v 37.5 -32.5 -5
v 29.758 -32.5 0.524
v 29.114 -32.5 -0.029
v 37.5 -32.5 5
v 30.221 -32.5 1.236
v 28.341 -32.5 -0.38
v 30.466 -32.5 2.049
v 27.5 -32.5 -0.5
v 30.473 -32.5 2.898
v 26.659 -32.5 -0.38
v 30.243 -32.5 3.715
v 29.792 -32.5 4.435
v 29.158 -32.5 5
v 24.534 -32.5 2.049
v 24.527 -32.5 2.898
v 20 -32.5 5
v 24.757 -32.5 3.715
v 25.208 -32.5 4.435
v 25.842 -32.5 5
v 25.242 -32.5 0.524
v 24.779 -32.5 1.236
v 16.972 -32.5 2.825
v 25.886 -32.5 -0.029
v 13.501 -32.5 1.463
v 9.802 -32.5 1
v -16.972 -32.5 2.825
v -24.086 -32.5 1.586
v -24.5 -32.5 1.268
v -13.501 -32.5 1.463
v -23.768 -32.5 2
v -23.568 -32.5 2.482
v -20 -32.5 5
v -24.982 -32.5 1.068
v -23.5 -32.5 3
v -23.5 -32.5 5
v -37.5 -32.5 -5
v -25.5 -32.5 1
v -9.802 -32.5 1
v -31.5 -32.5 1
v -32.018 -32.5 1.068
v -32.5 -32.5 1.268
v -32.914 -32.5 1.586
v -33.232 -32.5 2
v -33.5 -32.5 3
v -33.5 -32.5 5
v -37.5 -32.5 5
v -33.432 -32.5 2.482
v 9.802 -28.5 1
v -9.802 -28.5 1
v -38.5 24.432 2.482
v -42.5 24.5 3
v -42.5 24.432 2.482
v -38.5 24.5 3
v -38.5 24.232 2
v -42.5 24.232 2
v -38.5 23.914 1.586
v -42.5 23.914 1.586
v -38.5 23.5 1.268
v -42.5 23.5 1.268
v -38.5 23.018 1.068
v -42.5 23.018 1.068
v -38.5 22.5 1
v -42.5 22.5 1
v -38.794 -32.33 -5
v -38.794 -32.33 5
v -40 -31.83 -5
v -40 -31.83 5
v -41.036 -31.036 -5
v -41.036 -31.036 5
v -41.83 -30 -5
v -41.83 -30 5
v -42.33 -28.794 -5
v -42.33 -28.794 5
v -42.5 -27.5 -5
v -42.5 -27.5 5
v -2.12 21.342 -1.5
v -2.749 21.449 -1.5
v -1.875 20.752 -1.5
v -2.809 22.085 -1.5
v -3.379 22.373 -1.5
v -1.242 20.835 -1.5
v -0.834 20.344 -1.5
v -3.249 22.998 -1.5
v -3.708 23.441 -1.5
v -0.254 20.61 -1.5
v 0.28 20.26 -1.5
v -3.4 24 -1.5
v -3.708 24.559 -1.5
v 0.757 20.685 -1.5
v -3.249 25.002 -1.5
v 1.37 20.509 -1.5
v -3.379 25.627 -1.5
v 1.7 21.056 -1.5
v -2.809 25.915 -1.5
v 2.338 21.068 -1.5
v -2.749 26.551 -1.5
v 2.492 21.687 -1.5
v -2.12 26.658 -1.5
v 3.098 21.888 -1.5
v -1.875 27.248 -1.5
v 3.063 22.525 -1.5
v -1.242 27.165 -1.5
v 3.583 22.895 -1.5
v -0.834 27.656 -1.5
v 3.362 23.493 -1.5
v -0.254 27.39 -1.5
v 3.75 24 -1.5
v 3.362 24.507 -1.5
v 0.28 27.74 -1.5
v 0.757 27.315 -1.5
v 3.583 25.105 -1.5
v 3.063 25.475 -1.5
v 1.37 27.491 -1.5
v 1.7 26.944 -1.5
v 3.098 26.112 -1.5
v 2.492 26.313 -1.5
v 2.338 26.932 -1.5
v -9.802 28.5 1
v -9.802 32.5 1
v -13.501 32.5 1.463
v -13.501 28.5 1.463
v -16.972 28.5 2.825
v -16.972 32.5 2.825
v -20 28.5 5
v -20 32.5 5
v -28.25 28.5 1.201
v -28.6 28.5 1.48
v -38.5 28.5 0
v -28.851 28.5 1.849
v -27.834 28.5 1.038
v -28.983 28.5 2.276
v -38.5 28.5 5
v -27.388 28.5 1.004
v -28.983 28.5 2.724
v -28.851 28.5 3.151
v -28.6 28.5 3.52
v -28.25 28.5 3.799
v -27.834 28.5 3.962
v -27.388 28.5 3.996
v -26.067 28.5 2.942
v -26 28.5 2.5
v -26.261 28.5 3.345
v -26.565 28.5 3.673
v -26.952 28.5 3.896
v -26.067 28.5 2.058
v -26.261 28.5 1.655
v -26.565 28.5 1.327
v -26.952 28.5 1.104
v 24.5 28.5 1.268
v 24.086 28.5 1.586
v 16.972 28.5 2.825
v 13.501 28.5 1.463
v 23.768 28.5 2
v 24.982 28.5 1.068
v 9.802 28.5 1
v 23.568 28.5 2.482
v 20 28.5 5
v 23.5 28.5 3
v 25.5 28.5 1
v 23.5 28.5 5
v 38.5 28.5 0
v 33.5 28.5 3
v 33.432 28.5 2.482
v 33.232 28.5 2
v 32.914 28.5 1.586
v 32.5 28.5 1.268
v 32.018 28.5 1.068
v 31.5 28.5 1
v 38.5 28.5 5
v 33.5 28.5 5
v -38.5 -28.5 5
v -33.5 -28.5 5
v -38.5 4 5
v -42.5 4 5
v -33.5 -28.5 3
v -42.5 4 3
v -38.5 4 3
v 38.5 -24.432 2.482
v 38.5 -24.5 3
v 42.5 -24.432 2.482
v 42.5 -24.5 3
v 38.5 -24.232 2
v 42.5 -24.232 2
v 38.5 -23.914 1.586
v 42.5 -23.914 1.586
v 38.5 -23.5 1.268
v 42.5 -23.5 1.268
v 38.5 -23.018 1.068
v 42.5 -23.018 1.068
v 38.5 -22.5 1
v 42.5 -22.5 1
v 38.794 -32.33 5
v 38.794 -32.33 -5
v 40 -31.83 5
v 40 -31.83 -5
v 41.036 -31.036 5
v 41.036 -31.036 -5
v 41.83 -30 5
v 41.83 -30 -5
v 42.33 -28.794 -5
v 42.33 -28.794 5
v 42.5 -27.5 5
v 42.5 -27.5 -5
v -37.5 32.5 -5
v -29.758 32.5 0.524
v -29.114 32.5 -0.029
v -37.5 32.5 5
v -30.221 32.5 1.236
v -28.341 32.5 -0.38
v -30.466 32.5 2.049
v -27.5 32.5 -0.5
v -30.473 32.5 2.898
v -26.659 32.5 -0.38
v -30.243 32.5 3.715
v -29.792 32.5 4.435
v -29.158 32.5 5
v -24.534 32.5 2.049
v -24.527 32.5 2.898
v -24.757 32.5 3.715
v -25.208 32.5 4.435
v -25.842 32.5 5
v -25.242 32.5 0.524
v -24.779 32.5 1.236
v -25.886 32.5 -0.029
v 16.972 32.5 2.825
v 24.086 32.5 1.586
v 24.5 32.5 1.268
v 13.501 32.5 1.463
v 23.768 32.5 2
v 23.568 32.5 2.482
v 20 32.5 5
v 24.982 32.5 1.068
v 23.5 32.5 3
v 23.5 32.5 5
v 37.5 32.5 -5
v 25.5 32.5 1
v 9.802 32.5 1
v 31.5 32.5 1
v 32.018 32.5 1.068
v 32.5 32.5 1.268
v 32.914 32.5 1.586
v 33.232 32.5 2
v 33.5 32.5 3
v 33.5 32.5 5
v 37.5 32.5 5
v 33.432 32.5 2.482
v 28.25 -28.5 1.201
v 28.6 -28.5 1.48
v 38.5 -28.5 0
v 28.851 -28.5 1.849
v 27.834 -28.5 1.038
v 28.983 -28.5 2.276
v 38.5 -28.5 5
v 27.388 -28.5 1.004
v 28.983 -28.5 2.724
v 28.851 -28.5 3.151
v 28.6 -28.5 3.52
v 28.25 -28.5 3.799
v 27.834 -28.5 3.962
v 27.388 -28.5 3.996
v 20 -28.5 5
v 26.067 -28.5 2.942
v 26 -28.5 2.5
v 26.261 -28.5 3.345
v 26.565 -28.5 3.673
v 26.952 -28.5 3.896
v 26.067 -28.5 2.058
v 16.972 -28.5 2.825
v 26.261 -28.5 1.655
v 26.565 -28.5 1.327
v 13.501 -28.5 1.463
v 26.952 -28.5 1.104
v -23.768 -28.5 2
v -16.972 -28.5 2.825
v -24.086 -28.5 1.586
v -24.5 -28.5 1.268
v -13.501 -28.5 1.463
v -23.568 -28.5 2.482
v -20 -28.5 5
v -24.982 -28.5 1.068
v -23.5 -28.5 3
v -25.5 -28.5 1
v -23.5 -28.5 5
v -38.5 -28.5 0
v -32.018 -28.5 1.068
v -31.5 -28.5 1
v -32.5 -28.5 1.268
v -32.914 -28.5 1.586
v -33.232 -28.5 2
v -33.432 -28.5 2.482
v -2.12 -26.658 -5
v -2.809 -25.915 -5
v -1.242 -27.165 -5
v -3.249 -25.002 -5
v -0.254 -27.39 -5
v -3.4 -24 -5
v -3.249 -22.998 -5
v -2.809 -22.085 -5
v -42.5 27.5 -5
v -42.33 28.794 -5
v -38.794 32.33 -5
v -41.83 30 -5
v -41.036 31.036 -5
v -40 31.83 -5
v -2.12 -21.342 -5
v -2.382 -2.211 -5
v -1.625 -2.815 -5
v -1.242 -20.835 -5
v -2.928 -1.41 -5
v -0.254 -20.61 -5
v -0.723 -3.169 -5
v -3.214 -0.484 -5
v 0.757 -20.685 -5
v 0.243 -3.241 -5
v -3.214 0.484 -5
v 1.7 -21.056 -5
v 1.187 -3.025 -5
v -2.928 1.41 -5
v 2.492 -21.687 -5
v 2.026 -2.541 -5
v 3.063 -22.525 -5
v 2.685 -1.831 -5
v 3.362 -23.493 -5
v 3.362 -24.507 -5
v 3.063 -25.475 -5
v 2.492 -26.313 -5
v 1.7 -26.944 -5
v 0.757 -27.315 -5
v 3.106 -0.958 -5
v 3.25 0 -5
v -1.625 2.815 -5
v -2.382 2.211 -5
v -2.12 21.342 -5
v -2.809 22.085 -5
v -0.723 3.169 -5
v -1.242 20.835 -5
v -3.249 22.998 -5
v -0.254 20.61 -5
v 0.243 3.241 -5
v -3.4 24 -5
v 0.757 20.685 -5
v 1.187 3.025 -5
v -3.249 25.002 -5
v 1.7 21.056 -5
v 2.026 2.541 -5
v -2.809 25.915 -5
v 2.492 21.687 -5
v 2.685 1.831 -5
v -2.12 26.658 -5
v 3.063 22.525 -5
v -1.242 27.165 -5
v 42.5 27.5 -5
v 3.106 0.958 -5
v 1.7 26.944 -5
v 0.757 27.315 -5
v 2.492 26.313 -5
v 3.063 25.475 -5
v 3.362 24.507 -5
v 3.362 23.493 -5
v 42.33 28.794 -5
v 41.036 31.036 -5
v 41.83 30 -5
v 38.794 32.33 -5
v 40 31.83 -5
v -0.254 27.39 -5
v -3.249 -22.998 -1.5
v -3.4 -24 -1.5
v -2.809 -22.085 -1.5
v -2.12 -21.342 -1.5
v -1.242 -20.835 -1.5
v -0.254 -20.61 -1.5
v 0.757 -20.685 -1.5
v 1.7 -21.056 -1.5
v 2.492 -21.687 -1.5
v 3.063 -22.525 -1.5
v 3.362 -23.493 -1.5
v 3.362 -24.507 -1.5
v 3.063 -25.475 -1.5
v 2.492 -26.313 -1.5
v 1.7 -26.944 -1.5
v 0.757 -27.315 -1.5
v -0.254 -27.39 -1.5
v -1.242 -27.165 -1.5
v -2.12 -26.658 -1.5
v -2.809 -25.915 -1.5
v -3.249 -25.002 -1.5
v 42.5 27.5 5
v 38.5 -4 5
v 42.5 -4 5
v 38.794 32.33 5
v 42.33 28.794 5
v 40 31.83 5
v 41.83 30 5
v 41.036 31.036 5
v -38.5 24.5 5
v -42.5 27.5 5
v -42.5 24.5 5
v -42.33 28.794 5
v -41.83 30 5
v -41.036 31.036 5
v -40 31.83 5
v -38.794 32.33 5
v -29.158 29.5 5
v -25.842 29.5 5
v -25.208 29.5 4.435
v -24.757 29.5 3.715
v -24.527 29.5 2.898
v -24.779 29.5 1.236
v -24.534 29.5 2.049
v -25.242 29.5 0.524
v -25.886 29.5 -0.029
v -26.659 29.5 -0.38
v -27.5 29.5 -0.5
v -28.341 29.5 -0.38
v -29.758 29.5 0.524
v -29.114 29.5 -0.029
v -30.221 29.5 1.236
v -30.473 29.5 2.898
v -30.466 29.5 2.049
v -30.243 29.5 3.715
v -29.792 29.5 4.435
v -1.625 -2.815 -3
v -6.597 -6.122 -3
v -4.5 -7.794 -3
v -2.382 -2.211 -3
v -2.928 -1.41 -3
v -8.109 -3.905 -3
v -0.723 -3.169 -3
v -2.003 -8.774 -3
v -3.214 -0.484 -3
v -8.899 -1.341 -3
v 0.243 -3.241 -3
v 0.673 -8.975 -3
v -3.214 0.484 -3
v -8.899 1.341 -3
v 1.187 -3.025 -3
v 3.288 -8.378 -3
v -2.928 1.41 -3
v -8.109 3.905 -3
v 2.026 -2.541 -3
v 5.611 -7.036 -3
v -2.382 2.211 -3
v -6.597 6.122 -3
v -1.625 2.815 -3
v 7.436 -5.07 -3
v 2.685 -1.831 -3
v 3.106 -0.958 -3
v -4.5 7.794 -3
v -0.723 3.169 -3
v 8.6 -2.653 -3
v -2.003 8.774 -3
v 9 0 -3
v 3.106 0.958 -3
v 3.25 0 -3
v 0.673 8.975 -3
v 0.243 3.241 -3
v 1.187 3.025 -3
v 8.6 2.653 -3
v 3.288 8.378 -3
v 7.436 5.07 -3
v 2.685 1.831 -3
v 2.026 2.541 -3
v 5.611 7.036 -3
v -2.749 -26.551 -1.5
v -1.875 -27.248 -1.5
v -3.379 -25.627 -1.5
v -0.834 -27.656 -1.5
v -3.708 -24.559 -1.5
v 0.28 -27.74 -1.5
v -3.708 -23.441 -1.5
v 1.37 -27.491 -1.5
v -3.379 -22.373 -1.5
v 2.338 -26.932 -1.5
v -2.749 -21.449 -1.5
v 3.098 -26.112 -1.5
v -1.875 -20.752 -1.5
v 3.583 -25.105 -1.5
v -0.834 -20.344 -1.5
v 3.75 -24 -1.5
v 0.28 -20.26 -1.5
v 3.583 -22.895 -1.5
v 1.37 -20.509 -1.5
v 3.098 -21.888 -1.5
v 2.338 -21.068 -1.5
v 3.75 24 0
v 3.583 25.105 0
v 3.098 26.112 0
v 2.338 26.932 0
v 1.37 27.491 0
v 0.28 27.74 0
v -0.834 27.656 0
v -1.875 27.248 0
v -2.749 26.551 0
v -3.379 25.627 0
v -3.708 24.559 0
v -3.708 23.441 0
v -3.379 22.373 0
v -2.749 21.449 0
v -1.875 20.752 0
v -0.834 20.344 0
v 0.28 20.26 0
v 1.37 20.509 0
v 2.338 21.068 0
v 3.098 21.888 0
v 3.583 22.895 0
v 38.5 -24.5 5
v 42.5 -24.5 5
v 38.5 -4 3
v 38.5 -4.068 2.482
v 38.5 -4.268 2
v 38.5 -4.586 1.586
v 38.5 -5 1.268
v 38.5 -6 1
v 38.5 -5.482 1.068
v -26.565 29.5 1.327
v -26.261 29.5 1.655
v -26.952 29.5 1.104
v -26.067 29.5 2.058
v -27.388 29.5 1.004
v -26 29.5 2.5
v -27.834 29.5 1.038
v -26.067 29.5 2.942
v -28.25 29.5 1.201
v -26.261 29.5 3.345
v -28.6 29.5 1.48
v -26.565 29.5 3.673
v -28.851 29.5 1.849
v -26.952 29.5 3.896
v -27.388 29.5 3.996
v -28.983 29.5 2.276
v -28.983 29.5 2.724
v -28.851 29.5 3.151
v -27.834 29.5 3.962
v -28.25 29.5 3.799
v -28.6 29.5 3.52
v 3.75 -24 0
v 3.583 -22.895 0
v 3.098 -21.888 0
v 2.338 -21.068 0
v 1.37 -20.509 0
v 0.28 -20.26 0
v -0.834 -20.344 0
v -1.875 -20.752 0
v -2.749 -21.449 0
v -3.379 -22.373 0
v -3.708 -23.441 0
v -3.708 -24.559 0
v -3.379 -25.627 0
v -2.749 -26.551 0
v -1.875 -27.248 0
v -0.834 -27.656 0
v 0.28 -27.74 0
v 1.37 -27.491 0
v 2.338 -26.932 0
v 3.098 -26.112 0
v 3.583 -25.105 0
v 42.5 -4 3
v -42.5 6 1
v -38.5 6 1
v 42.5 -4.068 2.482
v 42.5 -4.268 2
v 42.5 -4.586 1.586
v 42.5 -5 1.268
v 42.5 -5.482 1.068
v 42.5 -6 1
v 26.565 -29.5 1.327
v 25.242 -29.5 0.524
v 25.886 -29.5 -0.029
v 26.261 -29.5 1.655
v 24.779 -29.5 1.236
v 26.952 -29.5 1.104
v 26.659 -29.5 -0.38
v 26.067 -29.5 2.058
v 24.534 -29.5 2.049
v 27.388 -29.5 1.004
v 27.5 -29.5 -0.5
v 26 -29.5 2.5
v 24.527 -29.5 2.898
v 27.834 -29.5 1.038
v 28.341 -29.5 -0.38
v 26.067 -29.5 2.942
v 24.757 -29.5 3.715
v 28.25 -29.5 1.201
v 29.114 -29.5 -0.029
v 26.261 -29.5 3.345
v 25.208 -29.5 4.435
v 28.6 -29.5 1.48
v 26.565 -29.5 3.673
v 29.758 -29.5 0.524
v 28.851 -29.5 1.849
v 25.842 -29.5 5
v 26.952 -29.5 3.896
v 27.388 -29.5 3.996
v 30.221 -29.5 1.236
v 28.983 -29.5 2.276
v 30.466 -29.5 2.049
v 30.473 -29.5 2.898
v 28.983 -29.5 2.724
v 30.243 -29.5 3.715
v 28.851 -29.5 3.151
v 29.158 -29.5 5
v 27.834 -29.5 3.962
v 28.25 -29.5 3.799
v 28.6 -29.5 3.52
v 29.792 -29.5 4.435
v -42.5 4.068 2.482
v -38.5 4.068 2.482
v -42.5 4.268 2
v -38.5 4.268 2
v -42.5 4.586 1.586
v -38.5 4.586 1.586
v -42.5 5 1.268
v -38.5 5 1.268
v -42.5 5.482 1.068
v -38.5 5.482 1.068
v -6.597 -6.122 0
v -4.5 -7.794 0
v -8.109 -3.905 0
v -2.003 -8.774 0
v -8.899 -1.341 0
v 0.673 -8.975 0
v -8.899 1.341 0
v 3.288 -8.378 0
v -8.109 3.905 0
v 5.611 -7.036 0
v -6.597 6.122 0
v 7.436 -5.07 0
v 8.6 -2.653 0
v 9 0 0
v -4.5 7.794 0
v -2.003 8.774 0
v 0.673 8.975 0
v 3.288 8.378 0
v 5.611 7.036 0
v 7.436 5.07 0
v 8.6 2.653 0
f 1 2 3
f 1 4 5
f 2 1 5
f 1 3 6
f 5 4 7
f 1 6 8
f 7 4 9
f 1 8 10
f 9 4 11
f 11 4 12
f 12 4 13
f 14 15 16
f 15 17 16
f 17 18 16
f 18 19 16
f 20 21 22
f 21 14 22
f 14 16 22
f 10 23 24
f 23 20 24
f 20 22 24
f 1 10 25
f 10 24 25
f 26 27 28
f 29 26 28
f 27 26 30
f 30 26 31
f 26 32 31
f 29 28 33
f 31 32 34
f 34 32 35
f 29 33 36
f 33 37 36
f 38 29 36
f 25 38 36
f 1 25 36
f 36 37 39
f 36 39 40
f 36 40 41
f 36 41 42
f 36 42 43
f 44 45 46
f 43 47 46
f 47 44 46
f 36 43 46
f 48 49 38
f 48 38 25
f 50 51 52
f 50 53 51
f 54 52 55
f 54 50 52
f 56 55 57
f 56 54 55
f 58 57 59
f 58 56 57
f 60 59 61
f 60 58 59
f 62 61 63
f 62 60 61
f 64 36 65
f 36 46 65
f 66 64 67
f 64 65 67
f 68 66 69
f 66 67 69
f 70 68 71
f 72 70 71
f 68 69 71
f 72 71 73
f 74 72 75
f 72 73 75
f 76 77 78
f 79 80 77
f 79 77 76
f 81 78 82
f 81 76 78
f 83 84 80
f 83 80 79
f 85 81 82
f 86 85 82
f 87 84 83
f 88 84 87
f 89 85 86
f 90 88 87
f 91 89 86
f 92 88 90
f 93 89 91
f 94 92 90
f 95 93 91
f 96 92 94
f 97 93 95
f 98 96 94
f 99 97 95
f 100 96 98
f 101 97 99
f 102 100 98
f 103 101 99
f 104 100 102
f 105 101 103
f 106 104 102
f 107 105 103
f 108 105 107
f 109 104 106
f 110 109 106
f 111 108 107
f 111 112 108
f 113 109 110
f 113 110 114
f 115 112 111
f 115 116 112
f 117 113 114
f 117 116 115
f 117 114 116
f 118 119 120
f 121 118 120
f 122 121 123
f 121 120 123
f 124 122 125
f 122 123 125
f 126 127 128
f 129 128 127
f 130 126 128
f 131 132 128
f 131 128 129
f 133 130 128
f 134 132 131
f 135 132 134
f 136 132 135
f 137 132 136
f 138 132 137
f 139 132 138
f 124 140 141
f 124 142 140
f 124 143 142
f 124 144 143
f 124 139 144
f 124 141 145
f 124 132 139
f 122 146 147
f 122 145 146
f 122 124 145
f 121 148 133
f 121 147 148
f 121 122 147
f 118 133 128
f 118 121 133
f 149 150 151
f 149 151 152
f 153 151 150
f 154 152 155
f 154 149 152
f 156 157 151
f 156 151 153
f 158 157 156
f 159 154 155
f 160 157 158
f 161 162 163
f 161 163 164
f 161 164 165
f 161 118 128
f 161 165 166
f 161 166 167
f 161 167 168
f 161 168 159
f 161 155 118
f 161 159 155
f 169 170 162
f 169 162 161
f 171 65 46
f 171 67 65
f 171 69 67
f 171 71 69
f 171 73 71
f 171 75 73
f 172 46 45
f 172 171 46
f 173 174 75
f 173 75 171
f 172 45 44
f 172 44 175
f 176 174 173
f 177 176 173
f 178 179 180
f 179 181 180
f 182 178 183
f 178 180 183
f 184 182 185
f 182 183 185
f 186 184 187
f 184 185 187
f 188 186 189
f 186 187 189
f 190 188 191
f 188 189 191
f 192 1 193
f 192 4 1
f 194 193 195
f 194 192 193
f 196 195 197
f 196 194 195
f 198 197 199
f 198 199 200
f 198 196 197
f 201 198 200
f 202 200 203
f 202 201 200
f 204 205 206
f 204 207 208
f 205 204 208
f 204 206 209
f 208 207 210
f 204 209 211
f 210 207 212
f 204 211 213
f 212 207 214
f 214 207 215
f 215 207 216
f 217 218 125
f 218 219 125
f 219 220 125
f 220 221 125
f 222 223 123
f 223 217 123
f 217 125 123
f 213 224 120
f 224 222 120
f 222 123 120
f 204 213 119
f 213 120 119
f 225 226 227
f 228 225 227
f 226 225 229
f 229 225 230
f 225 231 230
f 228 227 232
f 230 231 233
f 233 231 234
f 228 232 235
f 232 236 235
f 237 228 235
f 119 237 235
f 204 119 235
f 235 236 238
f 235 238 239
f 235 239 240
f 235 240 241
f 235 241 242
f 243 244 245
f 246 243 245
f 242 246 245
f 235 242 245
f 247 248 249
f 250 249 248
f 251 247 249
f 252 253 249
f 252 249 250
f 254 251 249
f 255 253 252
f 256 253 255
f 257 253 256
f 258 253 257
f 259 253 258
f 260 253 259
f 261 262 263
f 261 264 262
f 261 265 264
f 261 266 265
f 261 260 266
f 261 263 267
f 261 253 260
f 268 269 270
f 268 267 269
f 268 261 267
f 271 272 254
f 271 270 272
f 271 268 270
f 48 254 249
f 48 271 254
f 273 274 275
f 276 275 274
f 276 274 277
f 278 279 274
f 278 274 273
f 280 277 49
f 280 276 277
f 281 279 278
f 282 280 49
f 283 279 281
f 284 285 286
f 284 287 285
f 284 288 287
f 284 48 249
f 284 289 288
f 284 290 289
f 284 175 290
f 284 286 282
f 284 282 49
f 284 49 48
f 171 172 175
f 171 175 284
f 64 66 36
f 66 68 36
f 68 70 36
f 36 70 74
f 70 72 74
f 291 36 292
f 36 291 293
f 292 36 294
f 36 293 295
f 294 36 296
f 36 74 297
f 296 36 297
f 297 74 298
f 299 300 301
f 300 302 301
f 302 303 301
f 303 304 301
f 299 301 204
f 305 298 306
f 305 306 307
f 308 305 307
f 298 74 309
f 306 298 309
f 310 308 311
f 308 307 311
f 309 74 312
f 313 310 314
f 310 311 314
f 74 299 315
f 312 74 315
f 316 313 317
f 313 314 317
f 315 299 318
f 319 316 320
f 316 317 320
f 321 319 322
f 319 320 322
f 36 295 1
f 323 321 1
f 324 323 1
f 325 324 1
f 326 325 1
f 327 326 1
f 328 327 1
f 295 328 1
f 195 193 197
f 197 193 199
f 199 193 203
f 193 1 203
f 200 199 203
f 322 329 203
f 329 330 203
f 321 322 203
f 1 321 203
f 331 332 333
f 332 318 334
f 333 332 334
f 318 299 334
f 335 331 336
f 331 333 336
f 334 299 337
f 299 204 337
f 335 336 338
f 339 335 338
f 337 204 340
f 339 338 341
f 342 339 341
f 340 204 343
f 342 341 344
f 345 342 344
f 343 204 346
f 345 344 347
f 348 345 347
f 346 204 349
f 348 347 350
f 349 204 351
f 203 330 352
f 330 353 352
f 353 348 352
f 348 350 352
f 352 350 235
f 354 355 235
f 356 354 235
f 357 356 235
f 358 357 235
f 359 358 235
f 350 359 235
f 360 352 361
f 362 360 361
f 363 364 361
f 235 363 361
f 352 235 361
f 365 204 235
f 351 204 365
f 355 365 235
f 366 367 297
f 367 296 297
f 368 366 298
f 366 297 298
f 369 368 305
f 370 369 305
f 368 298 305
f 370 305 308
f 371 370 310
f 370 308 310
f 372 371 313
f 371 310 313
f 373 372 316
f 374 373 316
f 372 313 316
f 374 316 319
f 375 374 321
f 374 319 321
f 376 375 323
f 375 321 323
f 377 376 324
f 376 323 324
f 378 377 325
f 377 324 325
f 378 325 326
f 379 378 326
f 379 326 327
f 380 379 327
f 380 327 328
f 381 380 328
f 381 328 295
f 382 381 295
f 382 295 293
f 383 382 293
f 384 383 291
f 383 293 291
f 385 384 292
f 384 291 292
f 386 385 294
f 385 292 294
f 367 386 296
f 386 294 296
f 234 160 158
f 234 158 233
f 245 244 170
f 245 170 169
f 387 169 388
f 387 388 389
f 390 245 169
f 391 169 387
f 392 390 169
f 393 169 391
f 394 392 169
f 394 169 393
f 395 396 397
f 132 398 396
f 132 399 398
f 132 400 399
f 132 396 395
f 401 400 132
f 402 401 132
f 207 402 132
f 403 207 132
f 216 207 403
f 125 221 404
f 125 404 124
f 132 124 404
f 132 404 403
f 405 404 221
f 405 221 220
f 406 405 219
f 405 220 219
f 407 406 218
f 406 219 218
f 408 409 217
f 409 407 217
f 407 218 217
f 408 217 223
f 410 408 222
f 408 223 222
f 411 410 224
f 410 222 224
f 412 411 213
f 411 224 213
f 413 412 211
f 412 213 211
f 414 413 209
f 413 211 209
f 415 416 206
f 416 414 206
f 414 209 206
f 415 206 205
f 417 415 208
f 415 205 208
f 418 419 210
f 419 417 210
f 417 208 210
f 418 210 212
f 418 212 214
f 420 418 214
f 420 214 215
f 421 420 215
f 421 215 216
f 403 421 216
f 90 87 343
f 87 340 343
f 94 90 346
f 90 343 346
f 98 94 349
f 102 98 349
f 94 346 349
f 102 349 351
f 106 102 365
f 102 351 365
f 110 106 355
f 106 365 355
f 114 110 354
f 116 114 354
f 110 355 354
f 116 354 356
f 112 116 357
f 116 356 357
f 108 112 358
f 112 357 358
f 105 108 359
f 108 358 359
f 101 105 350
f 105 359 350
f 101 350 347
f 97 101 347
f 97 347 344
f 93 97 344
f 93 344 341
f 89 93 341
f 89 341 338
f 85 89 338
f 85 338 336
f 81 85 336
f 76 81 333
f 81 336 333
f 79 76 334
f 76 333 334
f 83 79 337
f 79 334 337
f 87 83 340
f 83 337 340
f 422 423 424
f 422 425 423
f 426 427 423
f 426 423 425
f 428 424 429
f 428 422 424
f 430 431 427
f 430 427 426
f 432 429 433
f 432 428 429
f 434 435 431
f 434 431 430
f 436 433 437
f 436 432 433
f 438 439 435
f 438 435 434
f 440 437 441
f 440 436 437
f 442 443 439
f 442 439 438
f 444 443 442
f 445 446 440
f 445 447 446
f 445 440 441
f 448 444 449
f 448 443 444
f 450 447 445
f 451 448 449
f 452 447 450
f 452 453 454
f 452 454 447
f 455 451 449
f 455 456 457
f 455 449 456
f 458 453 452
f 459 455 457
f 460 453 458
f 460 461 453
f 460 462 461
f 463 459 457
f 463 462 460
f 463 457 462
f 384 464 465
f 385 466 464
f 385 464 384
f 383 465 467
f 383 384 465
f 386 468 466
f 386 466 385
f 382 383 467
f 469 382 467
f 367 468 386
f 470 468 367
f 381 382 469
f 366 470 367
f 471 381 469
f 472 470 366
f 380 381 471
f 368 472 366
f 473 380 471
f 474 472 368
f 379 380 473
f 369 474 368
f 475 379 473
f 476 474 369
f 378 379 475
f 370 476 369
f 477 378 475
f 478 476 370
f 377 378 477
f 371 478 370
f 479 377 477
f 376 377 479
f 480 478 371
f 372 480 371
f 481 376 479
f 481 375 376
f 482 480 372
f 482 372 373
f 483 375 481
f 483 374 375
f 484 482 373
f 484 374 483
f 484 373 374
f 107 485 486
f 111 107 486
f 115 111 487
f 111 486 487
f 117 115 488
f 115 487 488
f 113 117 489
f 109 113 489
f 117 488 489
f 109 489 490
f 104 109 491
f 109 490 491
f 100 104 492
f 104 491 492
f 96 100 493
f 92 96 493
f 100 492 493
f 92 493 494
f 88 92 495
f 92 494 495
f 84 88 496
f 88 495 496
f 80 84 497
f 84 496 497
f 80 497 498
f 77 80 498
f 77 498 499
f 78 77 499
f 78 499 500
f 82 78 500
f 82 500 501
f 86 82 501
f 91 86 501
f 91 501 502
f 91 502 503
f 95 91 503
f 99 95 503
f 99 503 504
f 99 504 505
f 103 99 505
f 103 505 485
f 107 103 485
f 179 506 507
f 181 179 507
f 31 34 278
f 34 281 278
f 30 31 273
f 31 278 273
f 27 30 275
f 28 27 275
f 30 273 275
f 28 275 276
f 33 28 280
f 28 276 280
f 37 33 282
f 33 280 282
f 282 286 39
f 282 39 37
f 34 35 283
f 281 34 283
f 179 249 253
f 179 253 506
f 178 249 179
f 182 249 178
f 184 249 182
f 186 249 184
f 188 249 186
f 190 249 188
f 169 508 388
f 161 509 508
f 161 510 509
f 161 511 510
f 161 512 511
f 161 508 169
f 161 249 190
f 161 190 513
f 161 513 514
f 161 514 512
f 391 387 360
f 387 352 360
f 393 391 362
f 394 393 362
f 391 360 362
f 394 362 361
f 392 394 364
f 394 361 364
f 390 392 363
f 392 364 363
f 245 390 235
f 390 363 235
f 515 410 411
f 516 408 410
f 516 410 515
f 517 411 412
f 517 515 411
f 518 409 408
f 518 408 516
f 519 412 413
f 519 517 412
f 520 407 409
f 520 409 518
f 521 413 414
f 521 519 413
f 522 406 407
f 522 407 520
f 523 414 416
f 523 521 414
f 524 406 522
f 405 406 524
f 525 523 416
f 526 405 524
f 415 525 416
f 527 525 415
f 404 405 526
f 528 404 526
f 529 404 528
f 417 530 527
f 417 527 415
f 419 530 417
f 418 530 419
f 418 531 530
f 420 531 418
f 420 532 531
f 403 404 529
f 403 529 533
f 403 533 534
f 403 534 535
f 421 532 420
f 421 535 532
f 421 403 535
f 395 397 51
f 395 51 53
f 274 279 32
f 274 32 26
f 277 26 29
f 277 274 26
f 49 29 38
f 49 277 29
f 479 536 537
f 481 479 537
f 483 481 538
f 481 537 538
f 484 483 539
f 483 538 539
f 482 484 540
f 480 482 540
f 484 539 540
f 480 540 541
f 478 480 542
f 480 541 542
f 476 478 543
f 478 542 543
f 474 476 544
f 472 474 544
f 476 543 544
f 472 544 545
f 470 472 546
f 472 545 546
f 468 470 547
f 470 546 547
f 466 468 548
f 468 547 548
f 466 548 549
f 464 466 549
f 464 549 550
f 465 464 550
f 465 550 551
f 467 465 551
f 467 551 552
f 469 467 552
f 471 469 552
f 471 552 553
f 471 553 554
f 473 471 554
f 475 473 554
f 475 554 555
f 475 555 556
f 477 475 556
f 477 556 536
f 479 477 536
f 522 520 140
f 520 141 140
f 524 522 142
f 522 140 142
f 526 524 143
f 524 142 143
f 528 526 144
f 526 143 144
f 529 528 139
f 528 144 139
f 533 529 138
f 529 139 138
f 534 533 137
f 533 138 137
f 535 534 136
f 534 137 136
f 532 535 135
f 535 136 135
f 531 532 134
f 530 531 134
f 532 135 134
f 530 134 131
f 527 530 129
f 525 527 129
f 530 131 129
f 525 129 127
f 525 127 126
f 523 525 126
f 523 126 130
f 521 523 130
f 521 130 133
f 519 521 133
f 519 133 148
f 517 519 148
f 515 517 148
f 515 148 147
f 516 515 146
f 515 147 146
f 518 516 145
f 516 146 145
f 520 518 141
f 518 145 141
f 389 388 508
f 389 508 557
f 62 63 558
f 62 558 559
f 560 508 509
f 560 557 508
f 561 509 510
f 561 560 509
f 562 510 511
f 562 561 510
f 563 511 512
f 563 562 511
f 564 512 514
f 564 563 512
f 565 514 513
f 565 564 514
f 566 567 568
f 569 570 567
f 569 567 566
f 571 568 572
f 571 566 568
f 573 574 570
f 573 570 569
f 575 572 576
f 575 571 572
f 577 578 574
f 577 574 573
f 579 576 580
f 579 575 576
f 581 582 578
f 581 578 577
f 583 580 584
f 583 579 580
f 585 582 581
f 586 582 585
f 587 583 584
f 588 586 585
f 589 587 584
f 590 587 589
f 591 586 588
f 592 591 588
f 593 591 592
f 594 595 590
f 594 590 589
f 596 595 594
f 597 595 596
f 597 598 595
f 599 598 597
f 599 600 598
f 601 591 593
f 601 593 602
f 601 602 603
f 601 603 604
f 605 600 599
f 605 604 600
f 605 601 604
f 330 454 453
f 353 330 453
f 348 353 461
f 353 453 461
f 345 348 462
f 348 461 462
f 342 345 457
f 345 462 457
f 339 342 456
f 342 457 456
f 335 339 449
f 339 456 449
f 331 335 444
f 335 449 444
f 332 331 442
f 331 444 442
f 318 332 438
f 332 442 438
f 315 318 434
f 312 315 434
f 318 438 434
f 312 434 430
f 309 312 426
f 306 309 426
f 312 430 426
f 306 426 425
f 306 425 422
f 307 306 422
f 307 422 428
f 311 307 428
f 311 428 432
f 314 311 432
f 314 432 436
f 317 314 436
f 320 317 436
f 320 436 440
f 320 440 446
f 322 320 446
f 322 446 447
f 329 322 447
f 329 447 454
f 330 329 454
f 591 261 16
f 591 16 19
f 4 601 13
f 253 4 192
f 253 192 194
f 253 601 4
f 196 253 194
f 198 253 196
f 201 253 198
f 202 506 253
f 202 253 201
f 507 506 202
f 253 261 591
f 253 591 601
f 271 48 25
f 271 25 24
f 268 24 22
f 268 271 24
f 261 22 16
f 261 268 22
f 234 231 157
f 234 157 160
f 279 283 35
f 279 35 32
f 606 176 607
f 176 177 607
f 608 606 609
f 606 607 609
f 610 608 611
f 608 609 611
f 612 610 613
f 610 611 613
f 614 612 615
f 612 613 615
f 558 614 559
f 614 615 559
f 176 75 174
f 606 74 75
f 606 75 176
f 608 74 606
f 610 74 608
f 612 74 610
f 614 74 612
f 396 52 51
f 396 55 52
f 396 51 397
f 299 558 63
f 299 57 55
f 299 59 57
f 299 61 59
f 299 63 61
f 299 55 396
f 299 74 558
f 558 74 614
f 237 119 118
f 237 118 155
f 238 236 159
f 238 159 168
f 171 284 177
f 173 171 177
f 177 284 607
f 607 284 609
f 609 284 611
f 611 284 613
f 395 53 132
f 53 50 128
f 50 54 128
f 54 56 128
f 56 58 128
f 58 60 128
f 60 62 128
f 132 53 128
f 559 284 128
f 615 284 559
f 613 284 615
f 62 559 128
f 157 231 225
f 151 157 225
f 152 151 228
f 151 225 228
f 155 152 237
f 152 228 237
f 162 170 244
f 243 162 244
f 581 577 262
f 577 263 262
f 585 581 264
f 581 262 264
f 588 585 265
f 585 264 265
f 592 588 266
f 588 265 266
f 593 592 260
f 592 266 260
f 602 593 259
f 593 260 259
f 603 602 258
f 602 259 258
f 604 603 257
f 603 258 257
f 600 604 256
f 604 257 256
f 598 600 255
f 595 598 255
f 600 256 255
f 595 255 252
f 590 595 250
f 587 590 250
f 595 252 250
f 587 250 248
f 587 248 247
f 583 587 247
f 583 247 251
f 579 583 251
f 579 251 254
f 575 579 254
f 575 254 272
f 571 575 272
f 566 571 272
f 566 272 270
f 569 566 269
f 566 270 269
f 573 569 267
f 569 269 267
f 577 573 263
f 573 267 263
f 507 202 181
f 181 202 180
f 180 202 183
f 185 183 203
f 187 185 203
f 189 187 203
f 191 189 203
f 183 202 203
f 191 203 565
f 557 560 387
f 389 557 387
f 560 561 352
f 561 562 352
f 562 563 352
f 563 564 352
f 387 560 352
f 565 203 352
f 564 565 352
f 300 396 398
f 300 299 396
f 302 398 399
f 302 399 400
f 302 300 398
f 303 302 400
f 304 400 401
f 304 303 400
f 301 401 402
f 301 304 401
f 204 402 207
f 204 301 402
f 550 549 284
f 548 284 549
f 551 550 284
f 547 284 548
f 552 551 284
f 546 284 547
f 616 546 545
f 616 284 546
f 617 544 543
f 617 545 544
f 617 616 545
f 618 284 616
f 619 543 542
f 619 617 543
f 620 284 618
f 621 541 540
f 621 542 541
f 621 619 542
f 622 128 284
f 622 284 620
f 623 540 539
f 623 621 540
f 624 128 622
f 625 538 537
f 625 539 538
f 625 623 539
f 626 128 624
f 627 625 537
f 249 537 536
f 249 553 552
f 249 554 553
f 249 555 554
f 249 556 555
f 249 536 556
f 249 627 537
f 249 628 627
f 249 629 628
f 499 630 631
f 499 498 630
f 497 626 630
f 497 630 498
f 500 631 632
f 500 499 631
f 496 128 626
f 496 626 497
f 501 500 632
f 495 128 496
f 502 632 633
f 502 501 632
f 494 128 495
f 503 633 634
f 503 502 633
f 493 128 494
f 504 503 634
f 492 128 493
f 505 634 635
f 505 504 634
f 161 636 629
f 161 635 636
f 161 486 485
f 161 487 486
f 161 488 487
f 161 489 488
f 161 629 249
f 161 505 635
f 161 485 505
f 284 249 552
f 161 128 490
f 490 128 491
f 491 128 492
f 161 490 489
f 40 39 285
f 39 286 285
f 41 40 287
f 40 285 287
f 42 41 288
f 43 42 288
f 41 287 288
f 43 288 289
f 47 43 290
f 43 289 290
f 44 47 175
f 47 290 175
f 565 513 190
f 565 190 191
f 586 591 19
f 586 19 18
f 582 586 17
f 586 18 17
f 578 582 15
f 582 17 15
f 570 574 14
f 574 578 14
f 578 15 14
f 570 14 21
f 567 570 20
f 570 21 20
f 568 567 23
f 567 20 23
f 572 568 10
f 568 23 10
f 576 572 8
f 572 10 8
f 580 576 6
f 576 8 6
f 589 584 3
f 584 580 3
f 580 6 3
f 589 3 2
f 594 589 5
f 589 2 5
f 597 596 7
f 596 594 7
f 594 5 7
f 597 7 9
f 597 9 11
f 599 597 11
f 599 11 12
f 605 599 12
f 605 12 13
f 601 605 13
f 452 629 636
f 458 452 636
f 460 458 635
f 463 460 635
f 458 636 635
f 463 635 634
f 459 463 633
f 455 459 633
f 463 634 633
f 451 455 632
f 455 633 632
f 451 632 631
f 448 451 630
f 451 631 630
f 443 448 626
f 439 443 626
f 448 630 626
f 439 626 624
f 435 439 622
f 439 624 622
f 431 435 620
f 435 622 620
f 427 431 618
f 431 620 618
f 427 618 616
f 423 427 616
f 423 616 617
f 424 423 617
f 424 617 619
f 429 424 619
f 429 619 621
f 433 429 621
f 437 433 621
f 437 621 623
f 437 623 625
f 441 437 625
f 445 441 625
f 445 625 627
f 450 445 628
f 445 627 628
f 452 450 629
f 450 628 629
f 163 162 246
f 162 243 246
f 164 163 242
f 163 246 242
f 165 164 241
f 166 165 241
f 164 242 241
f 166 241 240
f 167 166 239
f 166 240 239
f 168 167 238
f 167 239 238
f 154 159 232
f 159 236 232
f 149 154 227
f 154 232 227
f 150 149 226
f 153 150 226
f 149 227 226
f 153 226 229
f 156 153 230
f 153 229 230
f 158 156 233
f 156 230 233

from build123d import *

# Parameters (mm, degrees)
F0_W                   = 85
F0_H                   = 65
F0_W_2                 = 77
F0_H_2                 = 57
F1_DEPTH               = 5
F2_DEPTH               = 5
F3_W                   = 10
F3_H                   = 4
F3_W_2                 = 40
F3_W_3                 = 4
F3_H_2                 = 20.5
F4_DEPTH               = 4
F5_T1_DEPTH            = 4
F5_T3_DEPTH            = 4
F6_R                   = 2
F8_D                   = 6.8
F8_CBORE_D             = 7.5
F8_CBORE_DEPTH         = 1.5
F9_R                   = 9
F9_R_2                 = 3.25
F10_DEPTH              = 3
F11_DEPTH              = 25
F12_R                  = 5
F15_D                  = 3
F15_CBORE_D            = 6
F15_CBORE_DEPTH        = 3
F15_ON_F13_D           = 3
F15_ON_F13_CBORE_D     = 6
F15_ON_F13_CBORE_DEPTH = 3


# Not quite as in the source:
# - a fillet or chamfer that OpenCascade refuses, or shapes differently, is made with other operations: its cross-section is extruded or revolved along the edge and cut away or added


with BuildPart() as f1:
    # F0 (on Top) → F1 (new body)
    with BuildSketch(Plane.XY):
        Rectangle(F0_W, F0_H)
        Rectangle(F0_W_2, F0_H_2, mode=Mode.SUBTRACT)
        Rectangle(F0_W_2, F0_H_2)
    extrude(amount=-F1_DEPTH)

    # F0 (on Top) → F2 (join)
    with BuildSketch(Plane.XY):
        Rectangle(F0_W, F0_H)
        Rectangle(F0_W_2, F0_H_2, mode=Mode.SUBTRACT)
    extrude(amount=F2_DEPTH)

    # F3 (on face) → F4 (cut)
    with BuildSketch(Plane.XY.offset(5)):
        with Locations((28.5, 30.5)):
            Rectangle(F3_W, F3_H)
        with Locations((0, 30.5)):
            Rectangle(F3_W_2, F3_H)
        with Locations((0, -30.5)):
            Rectangle(F3_W_2, F3_H)
        with Locations((-28.5, -30.5)):
            Rectangle(F3_W, F3_H)
        with Locations((-40.5, 14.25)):
            Rectangle(F3_W_3, F3_H_2)
        with Locations((40.5, -14.25)):
            Rectangle(F3_W_3, F3_H_2)
    extrude(amount=-F4_DEPTH, mode=Mode.SUBTRACT)

    # F5: fillet of radius 15 on 4 edges, made by hand

    # F5_s2 → F5_t1 (join)
    with BuildSketch(Plane.XZ.offset(-32.5)):
        with BuildLine():
            ThreePointArc((-9.8019609728, 1), (-15.2791865479, 2.0357599562), (-20, 5))
            Line((-20, 5), (-20, 1))
            Line((-20, 1), (-9.8019609728, 1))
        make_face()
        with BuildLine():
            ThreePointArc((20, 5), (15.2791865479, 2.0357599562), (9.8019609728, 1))
            Line((9.8019609728, 1), (20, 1))
            Line((20, 1), (20, 5))
        make_face()
    extrude(amount=F5_T1_DEPTH)

    # F5_s4 → F5_t3 (join)
    with BuildSketch(Plane.XZ.offset(28.5)):
        with BuildLine():
            ThreePointArc((9.8019609728, 1), (15.2791865479, 2.0357599562), (20, 5))
            Line((20, 5), (20, 1))
            Line((20, 1), (9.8019609728, 1))
        make_face()
        with BuildLine():
            ThreePointArc((-20, 5), (-15.2791865479, 2.0357599562), (-9.8019609728, 1))
            Line((-9.8019609728, 1), (-20, 1))
            Line((-20, 1), (-20, 5))
        make_face()
    extrude(amount=F5_T3_DEPTH)

    # F6
    f6_edges = [f1.edges().sort_by_distance(p)[0] for p in [
        (40.5, -4, 1),
        (40.5, -24.5, 1),
        (-40.5, 24.5, 1),
        (-40.5, 4, 1),
        (-33.5, -30.5, 1),
        (-23.5, -30.5, 1),
        (33.5, 30.5, 1),
        (23.5, 30.5, 1),
    ]]
    fillet(f6_edges, radius=F6_R)

    # F8 (through all)
    with Locations(Plane.XY):
        with Locations((0, 24), (0, -24)):
            CounterBoreHole(F8_D / 2, F8_CBORE_D / 2, F8_CBORE_DEPTH)

    # F9 (on face) → F10 (cut)
    with BuildSketch(Plane.XY):
        Circle(F9_R)
        Circle(F9_R_2, mode=Mode.SUBTRACT)
    extrude(amount=-F10_DEPTH, mode=Mode.SUBTRACT)

    # F9 (on face) → F11 (cut)
    with BuildSketch(Plane.XY):
        Circle(F9_R_2)
    extrude(amount=-F11_DEPTH, mode=Mode.SUBTRACT)

    # F12
    f12_edges = [f1.edges().sort_by_distance(p)[0] for p in [
        (42.5, -32.5, 0),
        (42.5, 32.5, 0),
        (-42.5, -32.5, 0),
        (-42.5, 32.5, 0),
    ]]
    fillet(f12_edges, radius=F12_R)

    # F15 (through all)
    with Locations(Plane(origin=(0, 32.5, 0), x_dir=(-1, 0, 0), z_dir=(0, 1, 0))):
        with Locations((27.5, 2.5)):
            CounterBoreHole(F15_D / 2, F15_CBORE_D / 2, F15_CBORE_DEPTH)

    # F15 on F13 (through all)
    with Locations(Plane.XZ.offset(32.5)):
        with Locations((27.5, 2.5)):
            CounterBoreHole(F15_ON_F13_D / 2, F15_ON_F13_CBORE_D / 2, F15_ON_F13_CBORE_DEPTH)


solid = f1.part
